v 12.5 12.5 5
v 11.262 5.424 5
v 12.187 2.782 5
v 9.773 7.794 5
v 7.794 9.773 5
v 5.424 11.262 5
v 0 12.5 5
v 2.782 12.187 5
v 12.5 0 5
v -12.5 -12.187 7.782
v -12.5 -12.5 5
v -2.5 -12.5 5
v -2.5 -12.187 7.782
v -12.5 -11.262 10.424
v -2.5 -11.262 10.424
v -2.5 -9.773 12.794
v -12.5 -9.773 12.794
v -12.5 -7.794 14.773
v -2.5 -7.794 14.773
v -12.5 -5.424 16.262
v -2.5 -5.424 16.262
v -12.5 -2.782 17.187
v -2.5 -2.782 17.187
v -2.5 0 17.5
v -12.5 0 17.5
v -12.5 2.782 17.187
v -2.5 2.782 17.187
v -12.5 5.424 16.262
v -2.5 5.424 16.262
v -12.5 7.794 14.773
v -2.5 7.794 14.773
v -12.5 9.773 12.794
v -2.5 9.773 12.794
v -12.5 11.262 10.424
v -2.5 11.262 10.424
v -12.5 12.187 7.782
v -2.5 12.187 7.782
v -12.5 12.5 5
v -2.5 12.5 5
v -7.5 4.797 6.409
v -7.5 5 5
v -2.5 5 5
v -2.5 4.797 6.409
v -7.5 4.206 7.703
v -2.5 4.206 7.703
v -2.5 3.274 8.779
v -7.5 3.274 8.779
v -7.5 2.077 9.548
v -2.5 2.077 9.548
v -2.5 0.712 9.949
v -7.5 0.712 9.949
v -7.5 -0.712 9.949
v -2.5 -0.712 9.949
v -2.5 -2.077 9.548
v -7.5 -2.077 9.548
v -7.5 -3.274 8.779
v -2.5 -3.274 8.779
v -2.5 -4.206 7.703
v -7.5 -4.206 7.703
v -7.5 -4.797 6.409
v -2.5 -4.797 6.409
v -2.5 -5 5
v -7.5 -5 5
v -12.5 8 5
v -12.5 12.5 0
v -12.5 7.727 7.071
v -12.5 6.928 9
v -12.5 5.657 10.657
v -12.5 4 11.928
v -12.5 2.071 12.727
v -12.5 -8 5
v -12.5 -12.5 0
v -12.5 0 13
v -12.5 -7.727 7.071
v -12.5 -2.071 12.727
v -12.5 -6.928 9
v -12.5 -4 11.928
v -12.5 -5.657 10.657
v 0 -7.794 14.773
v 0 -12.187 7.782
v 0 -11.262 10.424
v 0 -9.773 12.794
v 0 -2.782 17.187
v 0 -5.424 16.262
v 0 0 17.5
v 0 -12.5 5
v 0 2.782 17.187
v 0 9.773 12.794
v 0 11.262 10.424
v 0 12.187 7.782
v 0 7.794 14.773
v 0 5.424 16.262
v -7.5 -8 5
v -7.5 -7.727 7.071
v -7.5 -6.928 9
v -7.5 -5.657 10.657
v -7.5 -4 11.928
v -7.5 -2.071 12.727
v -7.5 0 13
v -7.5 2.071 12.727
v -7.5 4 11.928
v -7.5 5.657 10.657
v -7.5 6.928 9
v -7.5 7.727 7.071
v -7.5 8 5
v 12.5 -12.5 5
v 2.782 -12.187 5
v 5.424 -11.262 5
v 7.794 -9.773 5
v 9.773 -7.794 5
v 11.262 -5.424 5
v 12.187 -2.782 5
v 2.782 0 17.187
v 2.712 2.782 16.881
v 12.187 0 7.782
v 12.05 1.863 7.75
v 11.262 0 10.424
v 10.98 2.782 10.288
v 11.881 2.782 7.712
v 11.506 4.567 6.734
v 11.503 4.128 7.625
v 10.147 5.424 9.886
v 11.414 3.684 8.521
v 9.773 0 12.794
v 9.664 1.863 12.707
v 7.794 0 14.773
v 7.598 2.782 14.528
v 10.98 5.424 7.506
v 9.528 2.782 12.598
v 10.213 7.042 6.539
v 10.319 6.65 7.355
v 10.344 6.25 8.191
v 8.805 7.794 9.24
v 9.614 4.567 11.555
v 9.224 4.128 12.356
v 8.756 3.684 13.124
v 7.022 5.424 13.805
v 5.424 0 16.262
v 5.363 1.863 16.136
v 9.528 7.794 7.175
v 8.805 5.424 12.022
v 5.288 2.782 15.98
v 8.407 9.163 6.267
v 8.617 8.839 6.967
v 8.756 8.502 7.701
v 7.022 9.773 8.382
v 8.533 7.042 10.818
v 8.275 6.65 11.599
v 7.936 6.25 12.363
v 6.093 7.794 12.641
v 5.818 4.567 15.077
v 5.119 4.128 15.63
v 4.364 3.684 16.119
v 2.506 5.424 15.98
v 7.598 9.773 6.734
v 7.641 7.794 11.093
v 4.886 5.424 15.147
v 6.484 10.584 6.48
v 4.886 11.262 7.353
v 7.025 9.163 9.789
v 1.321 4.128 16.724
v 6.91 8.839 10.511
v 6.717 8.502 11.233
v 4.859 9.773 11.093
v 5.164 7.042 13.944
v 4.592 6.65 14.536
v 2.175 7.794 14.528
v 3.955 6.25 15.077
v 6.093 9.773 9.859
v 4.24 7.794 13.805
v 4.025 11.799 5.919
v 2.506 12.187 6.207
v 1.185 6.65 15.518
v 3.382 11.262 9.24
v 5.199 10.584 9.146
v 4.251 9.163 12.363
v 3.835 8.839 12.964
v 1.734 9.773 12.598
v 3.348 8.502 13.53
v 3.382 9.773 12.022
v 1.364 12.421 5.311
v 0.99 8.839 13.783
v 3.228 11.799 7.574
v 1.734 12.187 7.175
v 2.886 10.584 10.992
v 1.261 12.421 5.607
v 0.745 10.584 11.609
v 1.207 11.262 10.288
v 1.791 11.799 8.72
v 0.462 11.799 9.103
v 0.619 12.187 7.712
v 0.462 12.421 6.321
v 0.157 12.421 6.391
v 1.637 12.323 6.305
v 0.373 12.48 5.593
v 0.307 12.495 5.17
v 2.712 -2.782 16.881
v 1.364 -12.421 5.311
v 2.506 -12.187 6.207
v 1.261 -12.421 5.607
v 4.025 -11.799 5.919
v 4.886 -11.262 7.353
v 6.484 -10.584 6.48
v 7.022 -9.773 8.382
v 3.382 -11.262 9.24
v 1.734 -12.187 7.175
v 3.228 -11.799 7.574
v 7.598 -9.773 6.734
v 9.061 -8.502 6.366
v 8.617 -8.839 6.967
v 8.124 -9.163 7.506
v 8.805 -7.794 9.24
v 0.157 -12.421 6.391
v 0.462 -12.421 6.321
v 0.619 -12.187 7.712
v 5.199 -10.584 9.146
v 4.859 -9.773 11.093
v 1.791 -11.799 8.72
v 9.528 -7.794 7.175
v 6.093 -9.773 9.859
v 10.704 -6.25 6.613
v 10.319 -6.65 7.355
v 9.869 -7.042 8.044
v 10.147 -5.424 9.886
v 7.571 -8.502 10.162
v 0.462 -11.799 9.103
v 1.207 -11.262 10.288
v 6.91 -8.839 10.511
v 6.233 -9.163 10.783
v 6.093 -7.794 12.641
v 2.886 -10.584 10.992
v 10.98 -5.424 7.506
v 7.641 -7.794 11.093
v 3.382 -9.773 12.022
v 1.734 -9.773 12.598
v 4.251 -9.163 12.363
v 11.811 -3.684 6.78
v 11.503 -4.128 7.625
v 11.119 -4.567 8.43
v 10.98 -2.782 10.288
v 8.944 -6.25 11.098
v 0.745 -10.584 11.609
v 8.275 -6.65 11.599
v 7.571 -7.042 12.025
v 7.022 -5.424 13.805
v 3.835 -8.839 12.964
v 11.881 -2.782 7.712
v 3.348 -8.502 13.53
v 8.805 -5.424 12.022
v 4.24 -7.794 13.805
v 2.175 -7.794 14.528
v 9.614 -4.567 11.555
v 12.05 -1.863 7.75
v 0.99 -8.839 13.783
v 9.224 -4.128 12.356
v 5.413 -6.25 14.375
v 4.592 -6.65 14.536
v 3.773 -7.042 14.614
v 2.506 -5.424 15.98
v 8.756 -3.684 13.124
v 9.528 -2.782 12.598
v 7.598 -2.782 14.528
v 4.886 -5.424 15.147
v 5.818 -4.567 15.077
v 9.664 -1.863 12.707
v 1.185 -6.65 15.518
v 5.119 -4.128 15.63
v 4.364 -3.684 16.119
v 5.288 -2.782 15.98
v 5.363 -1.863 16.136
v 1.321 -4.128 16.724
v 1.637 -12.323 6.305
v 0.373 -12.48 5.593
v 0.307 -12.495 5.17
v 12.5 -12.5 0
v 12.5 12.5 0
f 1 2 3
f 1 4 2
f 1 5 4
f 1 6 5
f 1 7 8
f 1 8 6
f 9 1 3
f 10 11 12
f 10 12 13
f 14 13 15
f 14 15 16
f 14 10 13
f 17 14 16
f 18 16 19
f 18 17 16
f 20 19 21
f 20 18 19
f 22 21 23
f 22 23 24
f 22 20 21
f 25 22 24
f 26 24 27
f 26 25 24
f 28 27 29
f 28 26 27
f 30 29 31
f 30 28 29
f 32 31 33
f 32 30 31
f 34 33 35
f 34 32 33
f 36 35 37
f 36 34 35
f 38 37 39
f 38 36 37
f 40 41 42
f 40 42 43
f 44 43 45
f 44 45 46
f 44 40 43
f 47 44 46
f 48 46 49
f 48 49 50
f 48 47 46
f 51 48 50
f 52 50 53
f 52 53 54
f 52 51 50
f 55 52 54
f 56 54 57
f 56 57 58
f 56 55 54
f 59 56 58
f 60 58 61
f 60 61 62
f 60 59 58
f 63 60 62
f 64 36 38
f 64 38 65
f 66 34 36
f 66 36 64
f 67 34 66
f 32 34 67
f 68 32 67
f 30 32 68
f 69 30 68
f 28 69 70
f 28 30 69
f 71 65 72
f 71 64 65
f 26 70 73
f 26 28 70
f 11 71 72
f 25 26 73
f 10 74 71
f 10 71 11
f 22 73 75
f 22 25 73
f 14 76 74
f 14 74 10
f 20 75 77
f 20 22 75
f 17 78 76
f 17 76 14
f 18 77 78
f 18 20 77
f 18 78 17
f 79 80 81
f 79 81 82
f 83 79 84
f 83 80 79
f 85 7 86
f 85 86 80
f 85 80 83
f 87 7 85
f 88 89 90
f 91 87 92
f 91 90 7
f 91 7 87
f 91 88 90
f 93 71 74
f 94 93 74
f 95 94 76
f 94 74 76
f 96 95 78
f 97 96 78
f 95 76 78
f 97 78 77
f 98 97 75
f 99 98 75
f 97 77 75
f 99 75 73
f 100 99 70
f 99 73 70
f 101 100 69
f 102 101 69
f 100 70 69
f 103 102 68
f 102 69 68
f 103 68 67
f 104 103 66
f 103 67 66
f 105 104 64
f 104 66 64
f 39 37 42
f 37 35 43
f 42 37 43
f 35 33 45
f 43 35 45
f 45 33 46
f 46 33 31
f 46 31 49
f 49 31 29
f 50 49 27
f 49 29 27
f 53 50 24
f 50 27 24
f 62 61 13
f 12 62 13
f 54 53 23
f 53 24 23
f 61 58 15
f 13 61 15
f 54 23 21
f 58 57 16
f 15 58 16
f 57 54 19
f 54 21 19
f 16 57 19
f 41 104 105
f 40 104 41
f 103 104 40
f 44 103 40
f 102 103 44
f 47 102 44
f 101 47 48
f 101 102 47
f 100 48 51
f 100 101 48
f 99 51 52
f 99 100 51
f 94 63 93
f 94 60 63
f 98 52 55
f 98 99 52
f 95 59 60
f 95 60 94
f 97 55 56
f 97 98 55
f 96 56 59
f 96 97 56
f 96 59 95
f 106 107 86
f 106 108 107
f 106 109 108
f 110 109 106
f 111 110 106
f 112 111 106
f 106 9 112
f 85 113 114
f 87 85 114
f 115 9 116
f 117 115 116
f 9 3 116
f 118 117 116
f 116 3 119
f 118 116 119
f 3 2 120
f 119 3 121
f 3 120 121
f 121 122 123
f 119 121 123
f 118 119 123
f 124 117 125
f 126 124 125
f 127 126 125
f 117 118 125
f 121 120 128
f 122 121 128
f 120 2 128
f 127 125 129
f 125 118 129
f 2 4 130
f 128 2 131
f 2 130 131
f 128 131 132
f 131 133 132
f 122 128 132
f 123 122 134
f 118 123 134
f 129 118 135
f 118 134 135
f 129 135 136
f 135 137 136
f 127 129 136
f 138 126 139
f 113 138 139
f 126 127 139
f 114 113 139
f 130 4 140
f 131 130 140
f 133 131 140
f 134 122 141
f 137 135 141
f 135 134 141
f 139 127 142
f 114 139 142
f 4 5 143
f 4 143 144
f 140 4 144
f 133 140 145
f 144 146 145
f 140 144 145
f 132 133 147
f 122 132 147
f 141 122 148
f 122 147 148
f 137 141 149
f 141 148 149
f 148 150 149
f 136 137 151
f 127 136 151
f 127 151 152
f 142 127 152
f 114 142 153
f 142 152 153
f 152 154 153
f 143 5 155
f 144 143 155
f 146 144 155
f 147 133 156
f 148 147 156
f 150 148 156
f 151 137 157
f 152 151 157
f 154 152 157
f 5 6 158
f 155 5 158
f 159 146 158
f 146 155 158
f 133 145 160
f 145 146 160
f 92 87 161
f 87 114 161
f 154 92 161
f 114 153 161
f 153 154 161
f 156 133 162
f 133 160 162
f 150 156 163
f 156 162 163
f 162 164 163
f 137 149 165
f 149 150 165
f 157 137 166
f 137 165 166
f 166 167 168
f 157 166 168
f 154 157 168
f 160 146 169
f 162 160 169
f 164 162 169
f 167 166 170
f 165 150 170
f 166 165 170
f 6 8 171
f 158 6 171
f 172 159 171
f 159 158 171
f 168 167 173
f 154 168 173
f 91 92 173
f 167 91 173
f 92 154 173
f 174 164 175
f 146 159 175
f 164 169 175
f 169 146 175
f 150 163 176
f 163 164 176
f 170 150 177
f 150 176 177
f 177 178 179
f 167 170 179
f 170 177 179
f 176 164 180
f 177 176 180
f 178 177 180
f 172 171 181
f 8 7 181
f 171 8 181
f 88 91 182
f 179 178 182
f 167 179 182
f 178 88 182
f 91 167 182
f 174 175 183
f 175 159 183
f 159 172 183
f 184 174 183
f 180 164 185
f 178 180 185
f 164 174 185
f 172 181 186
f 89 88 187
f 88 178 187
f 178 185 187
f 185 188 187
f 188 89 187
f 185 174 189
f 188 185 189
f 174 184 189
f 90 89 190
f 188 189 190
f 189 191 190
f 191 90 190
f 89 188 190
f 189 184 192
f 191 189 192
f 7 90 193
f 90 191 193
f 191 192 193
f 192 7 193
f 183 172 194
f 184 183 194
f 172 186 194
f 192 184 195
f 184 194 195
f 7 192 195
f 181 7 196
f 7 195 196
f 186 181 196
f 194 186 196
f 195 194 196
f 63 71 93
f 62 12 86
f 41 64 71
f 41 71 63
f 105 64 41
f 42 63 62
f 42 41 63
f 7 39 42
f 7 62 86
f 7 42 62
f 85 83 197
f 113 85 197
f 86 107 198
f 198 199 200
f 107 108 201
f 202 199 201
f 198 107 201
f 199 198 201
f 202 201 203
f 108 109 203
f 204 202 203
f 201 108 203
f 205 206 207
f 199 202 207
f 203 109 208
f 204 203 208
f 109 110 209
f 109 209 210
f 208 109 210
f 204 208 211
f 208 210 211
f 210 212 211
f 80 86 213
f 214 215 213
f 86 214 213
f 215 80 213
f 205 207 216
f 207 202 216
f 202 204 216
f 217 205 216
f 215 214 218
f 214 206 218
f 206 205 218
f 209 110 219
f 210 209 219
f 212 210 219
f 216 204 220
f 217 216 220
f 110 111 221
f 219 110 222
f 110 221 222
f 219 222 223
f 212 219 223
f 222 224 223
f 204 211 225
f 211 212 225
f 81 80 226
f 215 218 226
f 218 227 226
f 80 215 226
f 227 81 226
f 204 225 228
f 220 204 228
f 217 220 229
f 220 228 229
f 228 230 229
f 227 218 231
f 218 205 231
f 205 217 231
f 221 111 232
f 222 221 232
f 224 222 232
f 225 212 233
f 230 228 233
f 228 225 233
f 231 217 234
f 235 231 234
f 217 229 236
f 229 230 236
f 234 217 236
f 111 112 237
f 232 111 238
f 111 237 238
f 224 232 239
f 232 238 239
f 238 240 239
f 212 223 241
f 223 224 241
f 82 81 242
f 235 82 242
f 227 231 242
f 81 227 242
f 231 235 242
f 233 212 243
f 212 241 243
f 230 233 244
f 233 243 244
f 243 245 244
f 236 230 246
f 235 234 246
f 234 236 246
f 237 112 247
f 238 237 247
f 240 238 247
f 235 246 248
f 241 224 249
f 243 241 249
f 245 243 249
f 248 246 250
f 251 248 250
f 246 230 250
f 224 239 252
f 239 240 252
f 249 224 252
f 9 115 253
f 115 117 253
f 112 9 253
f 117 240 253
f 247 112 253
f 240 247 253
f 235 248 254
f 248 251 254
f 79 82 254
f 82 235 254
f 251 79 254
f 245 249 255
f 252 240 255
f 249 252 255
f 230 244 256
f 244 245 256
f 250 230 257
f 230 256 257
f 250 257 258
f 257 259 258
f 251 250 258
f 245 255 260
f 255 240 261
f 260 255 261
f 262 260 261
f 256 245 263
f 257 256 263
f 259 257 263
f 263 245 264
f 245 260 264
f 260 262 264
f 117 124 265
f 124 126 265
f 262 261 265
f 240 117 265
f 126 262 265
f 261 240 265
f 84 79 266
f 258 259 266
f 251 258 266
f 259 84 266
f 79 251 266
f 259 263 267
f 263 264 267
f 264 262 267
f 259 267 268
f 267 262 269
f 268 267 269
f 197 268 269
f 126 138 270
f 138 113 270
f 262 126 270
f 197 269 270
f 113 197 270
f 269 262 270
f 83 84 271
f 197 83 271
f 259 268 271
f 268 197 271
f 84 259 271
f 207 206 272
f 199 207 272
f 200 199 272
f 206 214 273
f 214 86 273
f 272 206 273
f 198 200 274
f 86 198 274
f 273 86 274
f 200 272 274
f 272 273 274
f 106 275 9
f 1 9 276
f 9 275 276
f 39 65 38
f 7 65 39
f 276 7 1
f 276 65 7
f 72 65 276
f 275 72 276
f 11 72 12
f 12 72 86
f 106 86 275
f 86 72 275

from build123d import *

# Parameters (mm, degrees)
F0_W     = 25
F0_H     = 25
F1_DEPTH = 5
F3_ANGLE = 90
F5_DEPTH = 10
F6_DEPTH = 5


with BuildPart() as f1:
    # F0 (on Top) → F1 (new body)
    with BuildSketch(Plane.XY):
        Rectangle(F0_W, F0_H)
    extrude(amount=F1_DEPTH)

    # F2 (on face) → F3 (revolve)
    with BuildSketch(Plane.XY.offset(5)):
        with BuildLine():
            ThreePointArc((12.5, 0), (8.838835, 8.838835), (0, 12.5))
            Line((0, 12.5), (0, -12.5))
            ThreePointArc((0, -12.5), (8.838835, -8.838835), (12.5, 0))
        make_face()
    revolve(axis=Axis((0, 0, 5), (0, -1, 0)), revolution_arc=F3_ANGLE)

    # F4 (on face) → F5 (join)
    with BuildSketch(Plane(origin=(-12.5, 0, 0), x_dir=(0, -1, 0), z_dir=(-1, 0, 0))):
        with BuildLine():
            Line((8, 5), (12.5, 5))
            ThreePointArc((12.5, 5), (0, 17.5), (-12.5, 5))
            Line((-12.5, 5), (-8, 5))
            ThreePointArc((-8, 5), (0, 13), (8, 5))
        make_face()
        with BuildLine():
            Line((5, 5), (8, 5))
            ThreePointArc((8, 5), (0, 13), (-8, 5))
            Line((-8, 5), (-5, 5))
            ThreePointArc((-5, 5), (0, 10), (5, 5))
        make_face()
    extrude(amount=-F5_DEPTH)

    # F4 (on face) → F6 (cut)
    with BuildSketch(Plane(origin=(-12.5, 0, 0), x_dir=(0, -1, 0), z_dir=(-1, 0, 0))):
        with BuildLine():
            Line((5, 5), (8, 5))
            ThreePointArc((8, 5), (0, 13), (-8, 5))
            Line((-8, 5), (-5, 5))
            ThreePointArc((-5, 5), (0, 10), (5, 5))
        make_face()
    extrude(amount=-F6_DEPTH, mode=Mode.SUBTRACT)


solid = f1.part
